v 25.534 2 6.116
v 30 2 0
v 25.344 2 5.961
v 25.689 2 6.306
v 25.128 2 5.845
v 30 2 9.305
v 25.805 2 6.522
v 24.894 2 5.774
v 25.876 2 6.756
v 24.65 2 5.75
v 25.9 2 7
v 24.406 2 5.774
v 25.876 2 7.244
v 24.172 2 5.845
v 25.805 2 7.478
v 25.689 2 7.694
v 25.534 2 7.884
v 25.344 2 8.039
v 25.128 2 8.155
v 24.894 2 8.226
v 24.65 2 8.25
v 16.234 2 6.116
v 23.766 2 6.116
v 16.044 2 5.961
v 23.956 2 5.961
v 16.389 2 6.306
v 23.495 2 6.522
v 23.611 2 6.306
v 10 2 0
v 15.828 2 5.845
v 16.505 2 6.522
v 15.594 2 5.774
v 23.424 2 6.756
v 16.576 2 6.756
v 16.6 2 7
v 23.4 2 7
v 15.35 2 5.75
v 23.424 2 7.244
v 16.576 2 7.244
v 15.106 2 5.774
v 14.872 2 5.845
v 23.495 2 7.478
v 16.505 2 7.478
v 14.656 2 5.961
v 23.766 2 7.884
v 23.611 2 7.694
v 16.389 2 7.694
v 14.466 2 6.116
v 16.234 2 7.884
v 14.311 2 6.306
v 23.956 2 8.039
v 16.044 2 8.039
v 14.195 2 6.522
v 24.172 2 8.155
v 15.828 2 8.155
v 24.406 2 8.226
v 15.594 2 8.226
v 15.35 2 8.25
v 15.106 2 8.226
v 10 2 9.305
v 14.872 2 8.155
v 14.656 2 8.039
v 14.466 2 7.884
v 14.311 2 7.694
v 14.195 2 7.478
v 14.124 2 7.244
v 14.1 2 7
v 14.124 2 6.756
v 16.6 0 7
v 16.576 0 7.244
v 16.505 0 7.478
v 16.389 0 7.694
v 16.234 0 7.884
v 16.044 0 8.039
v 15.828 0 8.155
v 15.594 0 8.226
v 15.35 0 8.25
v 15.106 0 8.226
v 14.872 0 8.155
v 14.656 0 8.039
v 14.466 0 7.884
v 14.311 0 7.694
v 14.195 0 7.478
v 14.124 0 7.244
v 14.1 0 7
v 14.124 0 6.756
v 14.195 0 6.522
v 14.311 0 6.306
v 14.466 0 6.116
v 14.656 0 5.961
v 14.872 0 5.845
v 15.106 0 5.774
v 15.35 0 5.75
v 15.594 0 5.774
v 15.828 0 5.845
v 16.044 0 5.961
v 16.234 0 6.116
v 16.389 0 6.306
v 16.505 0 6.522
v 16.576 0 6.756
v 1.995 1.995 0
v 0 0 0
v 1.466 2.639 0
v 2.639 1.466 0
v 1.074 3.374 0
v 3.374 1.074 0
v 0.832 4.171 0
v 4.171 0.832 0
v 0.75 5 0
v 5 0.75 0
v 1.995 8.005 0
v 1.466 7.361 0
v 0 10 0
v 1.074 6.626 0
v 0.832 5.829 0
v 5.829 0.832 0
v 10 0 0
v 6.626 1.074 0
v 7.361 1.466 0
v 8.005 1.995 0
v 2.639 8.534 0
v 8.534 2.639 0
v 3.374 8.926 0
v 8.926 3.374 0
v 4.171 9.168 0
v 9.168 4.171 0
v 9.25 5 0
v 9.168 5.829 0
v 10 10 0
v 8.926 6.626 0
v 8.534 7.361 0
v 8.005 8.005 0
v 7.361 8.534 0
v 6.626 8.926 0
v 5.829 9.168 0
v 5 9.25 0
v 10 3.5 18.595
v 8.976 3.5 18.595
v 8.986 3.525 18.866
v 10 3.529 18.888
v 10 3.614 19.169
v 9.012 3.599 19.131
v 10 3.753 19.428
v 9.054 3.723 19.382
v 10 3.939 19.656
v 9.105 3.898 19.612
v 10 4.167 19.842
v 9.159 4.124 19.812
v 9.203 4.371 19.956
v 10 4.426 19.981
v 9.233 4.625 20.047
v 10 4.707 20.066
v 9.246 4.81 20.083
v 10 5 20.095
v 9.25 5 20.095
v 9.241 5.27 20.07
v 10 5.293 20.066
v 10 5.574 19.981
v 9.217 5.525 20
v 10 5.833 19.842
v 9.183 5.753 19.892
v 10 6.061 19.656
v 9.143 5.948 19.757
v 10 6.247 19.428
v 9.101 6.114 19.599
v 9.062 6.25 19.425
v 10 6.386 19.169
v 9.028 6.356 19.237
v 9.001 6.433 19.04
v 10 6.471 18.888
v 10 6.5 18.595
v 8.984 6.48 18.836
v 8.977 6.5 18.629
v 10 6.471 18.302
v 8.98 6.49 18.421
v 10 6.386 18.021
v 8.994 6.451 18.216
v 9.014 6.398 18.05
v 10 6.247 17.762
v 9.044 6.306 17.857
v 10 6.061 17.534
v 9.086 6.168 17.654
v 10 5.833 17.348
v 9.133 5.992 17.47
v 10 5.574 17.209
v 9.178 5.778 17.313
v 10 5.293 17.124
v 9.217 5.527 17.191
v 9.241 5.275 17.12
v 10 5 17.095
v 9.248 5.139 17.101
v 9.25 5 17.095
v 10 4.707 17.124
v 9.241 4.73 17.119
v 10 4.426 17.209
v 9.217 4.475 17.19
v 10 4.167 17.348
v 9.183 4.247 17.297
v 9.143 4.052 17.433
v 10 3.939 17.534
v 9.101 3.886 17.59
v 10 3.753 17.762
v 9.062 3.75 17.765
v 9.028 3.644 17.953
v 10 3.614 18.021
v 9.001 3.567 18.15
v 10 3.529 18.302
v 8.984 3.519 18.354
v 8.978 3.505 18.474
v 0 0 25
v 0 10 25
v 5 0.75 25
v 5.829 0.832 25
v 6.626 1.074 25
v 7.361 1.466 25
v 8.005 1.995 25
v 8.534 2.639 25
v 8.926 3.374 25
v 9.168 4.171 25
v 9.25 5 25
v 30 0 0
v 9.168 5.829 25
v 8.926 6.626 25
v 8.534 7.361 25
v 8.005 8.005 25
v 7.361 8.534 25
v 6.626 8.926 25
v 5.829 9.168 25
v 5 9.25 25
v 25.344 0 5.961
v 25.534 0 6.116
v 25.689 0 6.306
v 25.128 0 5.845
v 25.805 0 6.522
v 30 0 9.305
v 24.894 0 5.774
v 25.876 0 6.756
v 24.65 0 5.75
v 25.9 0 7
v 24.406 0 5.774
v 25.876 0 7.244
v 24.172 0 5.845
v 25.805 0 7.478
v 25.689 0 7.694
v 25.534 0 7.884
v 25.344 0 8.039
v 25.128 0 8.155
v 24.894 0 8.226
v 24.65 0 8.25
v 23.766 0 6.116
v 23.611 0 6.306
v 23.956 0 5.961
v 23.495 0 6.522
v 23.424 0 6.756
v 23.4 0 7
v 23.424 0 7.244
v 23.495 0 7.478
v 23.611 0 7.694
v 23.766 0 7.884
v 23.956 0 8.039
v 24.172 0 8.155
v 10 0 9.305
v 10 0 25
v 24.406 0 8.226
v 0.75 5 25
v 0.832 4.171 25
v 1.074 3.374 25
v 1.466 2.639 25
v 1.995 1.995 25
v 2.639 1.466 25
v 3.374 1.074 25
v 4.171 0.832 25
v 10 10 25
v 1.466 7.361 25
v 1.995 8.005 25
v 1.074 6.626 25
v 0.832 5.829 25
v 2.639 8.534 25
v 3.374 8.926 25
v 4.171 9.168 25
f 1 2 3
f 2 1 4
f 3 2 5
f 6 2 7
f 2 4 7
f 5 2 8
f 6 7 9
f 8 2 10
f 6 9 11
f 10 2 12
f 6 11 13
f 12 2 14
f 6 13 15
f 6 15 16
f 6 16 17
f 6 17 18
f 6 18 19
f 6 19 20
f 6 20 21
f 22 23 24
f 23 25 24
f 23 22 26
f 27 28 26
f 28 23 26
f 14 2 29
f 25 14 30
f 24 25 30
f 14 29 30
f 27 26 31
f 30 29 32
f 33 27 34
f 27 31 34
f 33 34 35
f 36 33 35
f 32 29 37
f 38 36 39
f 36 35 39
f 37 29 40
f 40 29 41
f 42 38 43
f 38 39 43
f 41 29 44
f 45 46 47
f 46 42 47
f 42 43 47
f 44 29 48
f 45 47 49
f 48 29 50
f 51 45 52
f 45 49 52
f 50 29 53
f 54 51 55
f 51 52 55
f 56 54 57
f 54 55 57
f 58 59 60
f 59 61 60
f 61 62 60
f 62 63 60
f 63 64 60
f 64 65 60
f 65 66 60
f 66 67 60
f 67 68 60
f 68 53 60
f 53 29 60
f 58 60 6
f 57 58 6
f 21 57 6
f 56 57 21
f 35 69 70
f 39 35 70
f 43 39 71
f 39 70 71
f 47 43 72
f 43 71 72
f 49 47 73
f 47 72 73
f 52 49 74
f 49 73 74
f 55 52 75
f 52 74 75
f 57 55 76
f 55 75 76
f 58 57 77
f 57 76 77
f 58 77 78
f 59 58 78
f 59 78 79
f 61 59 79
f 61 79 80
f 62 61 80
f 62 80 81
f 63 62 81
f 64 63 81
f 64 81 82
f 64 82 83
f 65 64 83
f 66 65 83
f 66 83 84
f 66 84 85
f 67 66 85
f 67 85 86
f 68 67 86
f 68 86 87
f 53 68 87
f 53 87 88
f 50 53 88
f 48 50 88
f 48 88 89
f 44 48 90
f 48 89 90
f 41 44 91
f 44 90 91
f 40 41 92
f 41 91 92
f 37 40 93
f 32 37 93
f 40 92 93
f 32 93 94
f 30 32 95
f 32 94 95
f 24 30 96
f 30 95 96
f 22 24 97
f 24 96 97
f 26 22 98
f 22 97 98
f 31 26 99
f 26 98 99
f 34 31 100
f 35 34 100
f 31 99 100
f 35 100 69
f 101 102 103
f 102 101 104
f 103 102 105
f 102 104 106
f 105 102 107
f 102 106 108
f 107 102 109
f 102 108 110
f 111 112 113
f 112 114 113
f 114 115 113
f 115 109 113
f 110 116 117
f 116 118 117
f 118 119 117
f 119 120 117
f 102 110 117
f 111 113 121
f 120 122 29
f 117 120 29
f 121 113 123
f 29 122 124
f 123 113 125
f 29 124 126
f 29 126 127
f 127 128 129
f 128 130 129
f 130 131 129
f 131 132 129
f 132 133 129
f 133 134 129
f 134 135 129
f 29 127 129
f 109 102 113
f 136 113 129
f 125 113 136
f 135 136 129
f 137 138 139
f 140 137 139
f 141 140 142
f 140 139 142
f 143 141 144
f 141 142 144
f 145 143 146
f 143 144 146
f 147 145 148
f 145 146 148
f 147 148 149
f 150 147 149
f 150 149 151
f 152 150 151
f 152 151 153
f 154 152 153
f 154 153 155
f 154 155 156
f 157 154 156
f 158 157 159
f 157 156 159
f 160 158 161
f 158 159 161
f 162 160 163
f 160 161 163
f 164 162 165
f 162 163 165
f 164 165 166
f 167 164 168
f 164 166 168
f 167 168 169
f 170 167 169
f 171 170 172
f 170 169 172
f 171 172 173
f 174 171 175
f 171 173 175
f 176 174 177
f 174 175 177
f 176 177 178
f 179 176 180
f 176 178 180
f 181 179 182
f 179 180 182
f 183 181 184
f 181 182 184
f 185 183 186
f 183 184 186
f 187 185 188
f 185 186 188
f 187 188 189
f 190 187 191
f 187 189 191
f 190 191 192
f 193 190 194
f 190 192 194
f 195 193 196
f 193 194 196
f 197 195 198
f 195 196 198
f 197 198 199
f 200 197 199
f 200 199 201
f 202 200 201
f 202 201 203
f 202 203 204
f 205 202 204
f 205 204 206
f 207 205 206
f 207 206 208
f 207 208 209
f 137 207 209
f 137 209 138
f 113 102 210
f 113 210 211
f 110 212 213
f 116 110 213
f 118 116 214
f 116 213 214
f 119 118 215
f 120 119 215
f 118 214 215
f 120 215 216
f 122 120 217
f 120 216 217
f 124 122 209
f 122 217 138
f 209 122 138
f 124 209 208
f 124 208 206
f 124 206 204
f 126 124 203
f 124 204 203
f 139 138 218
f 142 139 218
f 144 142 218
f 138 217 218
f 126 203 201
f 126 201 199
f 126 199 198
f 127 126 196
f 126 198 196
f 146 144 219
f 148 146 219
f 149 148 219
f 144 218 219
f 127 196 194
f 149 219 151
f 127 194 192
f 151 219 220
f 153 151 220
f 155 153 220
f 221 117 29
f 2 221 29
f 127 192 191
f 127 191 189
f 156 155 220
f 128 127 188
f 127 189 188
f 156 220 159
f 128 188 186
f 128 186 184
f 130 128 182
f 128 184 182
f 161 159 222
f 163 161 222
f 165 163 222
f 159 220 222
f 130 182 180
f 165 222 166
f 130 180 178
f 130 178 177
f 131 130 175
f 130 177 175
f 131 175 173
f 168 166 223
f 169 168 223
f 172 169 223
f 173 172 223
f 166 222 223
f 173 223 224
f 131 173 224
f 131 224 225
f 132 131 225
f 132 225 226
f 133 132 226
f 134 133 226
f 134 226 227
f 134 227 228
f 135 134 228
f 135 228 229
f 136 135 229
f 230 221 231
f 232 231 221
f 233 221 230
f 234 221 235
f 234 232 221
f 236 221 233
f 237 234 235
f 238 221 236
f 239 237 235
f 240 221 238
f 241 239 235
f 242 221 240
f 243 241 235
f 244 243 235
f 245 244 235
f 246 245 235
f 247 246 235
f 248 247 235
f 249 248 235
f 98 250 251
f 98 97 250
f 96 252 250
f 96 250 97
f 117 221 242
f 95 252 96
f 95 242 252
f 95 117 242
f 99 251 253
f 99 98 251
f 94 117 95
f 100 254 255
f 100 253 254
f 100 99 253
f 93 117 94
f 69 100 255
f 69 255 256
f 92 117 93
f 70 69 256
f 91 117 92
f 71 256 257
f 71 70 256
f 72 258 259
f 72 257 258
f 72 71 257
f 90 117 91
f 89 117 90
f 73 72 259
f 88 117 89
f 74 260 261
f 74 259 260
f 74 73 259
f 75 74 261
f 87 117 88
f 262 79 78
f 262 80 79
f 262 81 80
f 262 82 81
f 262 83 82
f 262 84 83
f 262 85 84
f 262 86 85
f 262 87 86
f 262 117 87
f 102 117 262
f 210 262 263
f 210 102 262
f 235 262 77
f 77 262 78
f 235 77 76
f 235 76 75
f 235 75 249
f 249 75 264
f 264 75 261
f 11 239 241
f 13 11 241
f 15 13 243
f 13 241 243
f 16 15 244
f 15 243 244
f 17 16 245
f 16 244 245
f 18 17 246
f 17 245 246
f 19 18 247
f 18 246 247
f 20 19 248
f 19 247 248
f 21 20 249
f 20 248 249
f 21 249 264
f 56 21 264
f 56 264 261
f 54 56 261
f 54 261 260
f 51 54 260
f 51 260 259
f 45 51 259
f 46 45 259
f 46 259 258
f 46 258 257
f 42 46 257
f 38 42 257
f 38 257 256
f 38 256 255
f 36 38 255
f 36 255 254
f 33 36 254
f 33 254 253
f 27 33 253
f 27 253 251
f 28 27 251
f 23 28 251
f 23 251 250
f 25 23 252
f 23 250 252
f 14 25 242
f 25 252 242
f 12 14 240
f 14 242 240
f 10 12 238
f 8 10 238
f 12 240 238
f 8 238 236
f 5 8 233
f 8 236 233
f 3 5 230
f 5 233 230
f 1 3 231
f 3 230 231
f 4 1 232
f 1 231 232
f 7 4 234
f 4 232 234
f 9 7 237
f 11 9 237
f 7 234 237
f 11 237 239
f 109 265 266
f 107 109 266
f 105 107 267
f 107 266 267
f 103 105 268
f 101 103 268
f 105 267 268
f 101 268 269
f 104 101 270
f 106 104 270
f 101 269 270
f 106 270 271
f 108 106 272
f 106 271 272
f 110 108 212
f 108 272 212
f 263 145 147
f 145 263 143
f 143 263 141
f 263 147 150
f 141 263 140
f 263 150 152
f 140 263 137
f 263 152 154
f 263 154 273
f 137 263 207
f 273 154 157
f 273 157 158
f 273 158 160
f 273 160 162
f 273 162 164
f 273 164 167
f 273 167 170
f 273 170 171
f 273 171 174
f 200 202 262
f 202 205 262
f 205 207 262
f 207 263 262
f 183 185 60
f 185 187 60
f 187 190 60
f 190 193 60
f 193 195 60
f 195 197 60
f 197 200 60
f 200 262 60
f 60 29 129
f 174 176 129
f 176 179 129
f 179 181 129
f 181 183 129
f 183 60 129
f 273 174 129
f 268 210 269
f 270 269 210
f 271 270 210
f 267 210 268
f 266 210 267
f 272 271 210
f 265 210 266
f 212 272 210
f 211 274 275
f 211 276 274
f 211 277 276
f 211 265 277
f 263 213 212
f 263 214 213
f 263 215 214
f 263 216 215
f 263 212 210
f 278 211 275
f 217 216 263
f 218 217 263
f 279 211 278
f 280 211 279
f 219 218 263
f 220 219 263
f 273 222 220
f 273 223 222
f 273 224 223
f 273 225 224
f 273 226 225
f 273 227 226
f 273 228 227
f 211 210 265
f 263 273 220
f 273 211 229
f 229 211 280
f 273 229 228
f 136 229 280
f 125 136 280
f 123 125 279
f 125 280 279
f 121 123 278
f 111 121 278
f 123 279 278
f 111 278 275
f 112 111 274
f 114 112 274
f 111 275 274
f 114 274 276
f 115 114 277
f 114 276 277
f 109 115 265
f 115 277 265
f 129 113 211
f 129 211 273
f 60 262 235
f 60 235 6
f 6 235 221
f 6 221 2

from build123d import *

# Parameters (mm, degrees)
F0_W     = 10
F0_H     = 10
F1_DEPTH = 25
F3_DEPTH = 25.001
F4_W     = 2
F4_H     = 9.304529
F5_DEPTH = 20
F7_D     = 2.5
F9_D     = 3
F9_DEPTH = 5


with BuildPart() as f1:
    # F0 (on Top) → F1 (new body)
    with BuildSketch(Plane.XY):
        with Locations((5, 5)):
            Rectangle(F0_W, F0_H)
    extrude(amount=F1_DEPTH)

    # F2 (on face) → F3 (cut, through all)
    with BuildSketch(Plane.XY.offset(25)):
        with BuildLine():
            ThreePointArc((9.25, 5), (8.005204, 8.005204), (5, 9.25))
            Line((5, 9.25), (5, 5))
            Line((5, 5), (9.25, 5))
        make_face()
        with BuildLine():
            Line((5, 5), (5, 9.25))
            ThreePointArc((5, 9.25), (1.994796, 8.005204), (0.75, 5))
            Line((0.75, 5), (5, 5))
        make_face()
        with BuildLine():
            Line((9.25, 5), (5, 5))
            Line((5, 5), (5, 0.75))
            ThreePointArc((5, 0.75), (8.005204, 1.994796), (9.25, 5))
        make_face()
        with BuildLine():
            Line((5, 0.75), (5, 5))
            Line((5, 5), (0.75, 5))
            ThreePointArc((0.75, 5), (1.994796, 1.994796), (5, 0.75))
        make_face()
    extrude(amount=-F3_DEPTH, mode=Mode.SUBTRACT)

    # F4 (on face) → F5 (join)
    with BuildSketch(Plane.YZ.offset(10)):
        with Locations((1, 4.652264)):
            Rectangle(F4_W, F4_H)
    extrude(amount=F5_DEPTH)

    # F7 (through all)
    with Locations(Plane(origin=(0, 2, 0), x_dir=(-1, 0, 0), z_dir=(0, 1, 0))):
        with Locations((-15.35, 7), (-24.65, 7)):
            Hole(F7_D / 2)

    # F9
    with Locations(Plane.YZ.offset(10)):
        with Locations((5, 18.594904)):
            Hole(F9_D / 2, depth=F9_DEPTH)


solid = f1.part
